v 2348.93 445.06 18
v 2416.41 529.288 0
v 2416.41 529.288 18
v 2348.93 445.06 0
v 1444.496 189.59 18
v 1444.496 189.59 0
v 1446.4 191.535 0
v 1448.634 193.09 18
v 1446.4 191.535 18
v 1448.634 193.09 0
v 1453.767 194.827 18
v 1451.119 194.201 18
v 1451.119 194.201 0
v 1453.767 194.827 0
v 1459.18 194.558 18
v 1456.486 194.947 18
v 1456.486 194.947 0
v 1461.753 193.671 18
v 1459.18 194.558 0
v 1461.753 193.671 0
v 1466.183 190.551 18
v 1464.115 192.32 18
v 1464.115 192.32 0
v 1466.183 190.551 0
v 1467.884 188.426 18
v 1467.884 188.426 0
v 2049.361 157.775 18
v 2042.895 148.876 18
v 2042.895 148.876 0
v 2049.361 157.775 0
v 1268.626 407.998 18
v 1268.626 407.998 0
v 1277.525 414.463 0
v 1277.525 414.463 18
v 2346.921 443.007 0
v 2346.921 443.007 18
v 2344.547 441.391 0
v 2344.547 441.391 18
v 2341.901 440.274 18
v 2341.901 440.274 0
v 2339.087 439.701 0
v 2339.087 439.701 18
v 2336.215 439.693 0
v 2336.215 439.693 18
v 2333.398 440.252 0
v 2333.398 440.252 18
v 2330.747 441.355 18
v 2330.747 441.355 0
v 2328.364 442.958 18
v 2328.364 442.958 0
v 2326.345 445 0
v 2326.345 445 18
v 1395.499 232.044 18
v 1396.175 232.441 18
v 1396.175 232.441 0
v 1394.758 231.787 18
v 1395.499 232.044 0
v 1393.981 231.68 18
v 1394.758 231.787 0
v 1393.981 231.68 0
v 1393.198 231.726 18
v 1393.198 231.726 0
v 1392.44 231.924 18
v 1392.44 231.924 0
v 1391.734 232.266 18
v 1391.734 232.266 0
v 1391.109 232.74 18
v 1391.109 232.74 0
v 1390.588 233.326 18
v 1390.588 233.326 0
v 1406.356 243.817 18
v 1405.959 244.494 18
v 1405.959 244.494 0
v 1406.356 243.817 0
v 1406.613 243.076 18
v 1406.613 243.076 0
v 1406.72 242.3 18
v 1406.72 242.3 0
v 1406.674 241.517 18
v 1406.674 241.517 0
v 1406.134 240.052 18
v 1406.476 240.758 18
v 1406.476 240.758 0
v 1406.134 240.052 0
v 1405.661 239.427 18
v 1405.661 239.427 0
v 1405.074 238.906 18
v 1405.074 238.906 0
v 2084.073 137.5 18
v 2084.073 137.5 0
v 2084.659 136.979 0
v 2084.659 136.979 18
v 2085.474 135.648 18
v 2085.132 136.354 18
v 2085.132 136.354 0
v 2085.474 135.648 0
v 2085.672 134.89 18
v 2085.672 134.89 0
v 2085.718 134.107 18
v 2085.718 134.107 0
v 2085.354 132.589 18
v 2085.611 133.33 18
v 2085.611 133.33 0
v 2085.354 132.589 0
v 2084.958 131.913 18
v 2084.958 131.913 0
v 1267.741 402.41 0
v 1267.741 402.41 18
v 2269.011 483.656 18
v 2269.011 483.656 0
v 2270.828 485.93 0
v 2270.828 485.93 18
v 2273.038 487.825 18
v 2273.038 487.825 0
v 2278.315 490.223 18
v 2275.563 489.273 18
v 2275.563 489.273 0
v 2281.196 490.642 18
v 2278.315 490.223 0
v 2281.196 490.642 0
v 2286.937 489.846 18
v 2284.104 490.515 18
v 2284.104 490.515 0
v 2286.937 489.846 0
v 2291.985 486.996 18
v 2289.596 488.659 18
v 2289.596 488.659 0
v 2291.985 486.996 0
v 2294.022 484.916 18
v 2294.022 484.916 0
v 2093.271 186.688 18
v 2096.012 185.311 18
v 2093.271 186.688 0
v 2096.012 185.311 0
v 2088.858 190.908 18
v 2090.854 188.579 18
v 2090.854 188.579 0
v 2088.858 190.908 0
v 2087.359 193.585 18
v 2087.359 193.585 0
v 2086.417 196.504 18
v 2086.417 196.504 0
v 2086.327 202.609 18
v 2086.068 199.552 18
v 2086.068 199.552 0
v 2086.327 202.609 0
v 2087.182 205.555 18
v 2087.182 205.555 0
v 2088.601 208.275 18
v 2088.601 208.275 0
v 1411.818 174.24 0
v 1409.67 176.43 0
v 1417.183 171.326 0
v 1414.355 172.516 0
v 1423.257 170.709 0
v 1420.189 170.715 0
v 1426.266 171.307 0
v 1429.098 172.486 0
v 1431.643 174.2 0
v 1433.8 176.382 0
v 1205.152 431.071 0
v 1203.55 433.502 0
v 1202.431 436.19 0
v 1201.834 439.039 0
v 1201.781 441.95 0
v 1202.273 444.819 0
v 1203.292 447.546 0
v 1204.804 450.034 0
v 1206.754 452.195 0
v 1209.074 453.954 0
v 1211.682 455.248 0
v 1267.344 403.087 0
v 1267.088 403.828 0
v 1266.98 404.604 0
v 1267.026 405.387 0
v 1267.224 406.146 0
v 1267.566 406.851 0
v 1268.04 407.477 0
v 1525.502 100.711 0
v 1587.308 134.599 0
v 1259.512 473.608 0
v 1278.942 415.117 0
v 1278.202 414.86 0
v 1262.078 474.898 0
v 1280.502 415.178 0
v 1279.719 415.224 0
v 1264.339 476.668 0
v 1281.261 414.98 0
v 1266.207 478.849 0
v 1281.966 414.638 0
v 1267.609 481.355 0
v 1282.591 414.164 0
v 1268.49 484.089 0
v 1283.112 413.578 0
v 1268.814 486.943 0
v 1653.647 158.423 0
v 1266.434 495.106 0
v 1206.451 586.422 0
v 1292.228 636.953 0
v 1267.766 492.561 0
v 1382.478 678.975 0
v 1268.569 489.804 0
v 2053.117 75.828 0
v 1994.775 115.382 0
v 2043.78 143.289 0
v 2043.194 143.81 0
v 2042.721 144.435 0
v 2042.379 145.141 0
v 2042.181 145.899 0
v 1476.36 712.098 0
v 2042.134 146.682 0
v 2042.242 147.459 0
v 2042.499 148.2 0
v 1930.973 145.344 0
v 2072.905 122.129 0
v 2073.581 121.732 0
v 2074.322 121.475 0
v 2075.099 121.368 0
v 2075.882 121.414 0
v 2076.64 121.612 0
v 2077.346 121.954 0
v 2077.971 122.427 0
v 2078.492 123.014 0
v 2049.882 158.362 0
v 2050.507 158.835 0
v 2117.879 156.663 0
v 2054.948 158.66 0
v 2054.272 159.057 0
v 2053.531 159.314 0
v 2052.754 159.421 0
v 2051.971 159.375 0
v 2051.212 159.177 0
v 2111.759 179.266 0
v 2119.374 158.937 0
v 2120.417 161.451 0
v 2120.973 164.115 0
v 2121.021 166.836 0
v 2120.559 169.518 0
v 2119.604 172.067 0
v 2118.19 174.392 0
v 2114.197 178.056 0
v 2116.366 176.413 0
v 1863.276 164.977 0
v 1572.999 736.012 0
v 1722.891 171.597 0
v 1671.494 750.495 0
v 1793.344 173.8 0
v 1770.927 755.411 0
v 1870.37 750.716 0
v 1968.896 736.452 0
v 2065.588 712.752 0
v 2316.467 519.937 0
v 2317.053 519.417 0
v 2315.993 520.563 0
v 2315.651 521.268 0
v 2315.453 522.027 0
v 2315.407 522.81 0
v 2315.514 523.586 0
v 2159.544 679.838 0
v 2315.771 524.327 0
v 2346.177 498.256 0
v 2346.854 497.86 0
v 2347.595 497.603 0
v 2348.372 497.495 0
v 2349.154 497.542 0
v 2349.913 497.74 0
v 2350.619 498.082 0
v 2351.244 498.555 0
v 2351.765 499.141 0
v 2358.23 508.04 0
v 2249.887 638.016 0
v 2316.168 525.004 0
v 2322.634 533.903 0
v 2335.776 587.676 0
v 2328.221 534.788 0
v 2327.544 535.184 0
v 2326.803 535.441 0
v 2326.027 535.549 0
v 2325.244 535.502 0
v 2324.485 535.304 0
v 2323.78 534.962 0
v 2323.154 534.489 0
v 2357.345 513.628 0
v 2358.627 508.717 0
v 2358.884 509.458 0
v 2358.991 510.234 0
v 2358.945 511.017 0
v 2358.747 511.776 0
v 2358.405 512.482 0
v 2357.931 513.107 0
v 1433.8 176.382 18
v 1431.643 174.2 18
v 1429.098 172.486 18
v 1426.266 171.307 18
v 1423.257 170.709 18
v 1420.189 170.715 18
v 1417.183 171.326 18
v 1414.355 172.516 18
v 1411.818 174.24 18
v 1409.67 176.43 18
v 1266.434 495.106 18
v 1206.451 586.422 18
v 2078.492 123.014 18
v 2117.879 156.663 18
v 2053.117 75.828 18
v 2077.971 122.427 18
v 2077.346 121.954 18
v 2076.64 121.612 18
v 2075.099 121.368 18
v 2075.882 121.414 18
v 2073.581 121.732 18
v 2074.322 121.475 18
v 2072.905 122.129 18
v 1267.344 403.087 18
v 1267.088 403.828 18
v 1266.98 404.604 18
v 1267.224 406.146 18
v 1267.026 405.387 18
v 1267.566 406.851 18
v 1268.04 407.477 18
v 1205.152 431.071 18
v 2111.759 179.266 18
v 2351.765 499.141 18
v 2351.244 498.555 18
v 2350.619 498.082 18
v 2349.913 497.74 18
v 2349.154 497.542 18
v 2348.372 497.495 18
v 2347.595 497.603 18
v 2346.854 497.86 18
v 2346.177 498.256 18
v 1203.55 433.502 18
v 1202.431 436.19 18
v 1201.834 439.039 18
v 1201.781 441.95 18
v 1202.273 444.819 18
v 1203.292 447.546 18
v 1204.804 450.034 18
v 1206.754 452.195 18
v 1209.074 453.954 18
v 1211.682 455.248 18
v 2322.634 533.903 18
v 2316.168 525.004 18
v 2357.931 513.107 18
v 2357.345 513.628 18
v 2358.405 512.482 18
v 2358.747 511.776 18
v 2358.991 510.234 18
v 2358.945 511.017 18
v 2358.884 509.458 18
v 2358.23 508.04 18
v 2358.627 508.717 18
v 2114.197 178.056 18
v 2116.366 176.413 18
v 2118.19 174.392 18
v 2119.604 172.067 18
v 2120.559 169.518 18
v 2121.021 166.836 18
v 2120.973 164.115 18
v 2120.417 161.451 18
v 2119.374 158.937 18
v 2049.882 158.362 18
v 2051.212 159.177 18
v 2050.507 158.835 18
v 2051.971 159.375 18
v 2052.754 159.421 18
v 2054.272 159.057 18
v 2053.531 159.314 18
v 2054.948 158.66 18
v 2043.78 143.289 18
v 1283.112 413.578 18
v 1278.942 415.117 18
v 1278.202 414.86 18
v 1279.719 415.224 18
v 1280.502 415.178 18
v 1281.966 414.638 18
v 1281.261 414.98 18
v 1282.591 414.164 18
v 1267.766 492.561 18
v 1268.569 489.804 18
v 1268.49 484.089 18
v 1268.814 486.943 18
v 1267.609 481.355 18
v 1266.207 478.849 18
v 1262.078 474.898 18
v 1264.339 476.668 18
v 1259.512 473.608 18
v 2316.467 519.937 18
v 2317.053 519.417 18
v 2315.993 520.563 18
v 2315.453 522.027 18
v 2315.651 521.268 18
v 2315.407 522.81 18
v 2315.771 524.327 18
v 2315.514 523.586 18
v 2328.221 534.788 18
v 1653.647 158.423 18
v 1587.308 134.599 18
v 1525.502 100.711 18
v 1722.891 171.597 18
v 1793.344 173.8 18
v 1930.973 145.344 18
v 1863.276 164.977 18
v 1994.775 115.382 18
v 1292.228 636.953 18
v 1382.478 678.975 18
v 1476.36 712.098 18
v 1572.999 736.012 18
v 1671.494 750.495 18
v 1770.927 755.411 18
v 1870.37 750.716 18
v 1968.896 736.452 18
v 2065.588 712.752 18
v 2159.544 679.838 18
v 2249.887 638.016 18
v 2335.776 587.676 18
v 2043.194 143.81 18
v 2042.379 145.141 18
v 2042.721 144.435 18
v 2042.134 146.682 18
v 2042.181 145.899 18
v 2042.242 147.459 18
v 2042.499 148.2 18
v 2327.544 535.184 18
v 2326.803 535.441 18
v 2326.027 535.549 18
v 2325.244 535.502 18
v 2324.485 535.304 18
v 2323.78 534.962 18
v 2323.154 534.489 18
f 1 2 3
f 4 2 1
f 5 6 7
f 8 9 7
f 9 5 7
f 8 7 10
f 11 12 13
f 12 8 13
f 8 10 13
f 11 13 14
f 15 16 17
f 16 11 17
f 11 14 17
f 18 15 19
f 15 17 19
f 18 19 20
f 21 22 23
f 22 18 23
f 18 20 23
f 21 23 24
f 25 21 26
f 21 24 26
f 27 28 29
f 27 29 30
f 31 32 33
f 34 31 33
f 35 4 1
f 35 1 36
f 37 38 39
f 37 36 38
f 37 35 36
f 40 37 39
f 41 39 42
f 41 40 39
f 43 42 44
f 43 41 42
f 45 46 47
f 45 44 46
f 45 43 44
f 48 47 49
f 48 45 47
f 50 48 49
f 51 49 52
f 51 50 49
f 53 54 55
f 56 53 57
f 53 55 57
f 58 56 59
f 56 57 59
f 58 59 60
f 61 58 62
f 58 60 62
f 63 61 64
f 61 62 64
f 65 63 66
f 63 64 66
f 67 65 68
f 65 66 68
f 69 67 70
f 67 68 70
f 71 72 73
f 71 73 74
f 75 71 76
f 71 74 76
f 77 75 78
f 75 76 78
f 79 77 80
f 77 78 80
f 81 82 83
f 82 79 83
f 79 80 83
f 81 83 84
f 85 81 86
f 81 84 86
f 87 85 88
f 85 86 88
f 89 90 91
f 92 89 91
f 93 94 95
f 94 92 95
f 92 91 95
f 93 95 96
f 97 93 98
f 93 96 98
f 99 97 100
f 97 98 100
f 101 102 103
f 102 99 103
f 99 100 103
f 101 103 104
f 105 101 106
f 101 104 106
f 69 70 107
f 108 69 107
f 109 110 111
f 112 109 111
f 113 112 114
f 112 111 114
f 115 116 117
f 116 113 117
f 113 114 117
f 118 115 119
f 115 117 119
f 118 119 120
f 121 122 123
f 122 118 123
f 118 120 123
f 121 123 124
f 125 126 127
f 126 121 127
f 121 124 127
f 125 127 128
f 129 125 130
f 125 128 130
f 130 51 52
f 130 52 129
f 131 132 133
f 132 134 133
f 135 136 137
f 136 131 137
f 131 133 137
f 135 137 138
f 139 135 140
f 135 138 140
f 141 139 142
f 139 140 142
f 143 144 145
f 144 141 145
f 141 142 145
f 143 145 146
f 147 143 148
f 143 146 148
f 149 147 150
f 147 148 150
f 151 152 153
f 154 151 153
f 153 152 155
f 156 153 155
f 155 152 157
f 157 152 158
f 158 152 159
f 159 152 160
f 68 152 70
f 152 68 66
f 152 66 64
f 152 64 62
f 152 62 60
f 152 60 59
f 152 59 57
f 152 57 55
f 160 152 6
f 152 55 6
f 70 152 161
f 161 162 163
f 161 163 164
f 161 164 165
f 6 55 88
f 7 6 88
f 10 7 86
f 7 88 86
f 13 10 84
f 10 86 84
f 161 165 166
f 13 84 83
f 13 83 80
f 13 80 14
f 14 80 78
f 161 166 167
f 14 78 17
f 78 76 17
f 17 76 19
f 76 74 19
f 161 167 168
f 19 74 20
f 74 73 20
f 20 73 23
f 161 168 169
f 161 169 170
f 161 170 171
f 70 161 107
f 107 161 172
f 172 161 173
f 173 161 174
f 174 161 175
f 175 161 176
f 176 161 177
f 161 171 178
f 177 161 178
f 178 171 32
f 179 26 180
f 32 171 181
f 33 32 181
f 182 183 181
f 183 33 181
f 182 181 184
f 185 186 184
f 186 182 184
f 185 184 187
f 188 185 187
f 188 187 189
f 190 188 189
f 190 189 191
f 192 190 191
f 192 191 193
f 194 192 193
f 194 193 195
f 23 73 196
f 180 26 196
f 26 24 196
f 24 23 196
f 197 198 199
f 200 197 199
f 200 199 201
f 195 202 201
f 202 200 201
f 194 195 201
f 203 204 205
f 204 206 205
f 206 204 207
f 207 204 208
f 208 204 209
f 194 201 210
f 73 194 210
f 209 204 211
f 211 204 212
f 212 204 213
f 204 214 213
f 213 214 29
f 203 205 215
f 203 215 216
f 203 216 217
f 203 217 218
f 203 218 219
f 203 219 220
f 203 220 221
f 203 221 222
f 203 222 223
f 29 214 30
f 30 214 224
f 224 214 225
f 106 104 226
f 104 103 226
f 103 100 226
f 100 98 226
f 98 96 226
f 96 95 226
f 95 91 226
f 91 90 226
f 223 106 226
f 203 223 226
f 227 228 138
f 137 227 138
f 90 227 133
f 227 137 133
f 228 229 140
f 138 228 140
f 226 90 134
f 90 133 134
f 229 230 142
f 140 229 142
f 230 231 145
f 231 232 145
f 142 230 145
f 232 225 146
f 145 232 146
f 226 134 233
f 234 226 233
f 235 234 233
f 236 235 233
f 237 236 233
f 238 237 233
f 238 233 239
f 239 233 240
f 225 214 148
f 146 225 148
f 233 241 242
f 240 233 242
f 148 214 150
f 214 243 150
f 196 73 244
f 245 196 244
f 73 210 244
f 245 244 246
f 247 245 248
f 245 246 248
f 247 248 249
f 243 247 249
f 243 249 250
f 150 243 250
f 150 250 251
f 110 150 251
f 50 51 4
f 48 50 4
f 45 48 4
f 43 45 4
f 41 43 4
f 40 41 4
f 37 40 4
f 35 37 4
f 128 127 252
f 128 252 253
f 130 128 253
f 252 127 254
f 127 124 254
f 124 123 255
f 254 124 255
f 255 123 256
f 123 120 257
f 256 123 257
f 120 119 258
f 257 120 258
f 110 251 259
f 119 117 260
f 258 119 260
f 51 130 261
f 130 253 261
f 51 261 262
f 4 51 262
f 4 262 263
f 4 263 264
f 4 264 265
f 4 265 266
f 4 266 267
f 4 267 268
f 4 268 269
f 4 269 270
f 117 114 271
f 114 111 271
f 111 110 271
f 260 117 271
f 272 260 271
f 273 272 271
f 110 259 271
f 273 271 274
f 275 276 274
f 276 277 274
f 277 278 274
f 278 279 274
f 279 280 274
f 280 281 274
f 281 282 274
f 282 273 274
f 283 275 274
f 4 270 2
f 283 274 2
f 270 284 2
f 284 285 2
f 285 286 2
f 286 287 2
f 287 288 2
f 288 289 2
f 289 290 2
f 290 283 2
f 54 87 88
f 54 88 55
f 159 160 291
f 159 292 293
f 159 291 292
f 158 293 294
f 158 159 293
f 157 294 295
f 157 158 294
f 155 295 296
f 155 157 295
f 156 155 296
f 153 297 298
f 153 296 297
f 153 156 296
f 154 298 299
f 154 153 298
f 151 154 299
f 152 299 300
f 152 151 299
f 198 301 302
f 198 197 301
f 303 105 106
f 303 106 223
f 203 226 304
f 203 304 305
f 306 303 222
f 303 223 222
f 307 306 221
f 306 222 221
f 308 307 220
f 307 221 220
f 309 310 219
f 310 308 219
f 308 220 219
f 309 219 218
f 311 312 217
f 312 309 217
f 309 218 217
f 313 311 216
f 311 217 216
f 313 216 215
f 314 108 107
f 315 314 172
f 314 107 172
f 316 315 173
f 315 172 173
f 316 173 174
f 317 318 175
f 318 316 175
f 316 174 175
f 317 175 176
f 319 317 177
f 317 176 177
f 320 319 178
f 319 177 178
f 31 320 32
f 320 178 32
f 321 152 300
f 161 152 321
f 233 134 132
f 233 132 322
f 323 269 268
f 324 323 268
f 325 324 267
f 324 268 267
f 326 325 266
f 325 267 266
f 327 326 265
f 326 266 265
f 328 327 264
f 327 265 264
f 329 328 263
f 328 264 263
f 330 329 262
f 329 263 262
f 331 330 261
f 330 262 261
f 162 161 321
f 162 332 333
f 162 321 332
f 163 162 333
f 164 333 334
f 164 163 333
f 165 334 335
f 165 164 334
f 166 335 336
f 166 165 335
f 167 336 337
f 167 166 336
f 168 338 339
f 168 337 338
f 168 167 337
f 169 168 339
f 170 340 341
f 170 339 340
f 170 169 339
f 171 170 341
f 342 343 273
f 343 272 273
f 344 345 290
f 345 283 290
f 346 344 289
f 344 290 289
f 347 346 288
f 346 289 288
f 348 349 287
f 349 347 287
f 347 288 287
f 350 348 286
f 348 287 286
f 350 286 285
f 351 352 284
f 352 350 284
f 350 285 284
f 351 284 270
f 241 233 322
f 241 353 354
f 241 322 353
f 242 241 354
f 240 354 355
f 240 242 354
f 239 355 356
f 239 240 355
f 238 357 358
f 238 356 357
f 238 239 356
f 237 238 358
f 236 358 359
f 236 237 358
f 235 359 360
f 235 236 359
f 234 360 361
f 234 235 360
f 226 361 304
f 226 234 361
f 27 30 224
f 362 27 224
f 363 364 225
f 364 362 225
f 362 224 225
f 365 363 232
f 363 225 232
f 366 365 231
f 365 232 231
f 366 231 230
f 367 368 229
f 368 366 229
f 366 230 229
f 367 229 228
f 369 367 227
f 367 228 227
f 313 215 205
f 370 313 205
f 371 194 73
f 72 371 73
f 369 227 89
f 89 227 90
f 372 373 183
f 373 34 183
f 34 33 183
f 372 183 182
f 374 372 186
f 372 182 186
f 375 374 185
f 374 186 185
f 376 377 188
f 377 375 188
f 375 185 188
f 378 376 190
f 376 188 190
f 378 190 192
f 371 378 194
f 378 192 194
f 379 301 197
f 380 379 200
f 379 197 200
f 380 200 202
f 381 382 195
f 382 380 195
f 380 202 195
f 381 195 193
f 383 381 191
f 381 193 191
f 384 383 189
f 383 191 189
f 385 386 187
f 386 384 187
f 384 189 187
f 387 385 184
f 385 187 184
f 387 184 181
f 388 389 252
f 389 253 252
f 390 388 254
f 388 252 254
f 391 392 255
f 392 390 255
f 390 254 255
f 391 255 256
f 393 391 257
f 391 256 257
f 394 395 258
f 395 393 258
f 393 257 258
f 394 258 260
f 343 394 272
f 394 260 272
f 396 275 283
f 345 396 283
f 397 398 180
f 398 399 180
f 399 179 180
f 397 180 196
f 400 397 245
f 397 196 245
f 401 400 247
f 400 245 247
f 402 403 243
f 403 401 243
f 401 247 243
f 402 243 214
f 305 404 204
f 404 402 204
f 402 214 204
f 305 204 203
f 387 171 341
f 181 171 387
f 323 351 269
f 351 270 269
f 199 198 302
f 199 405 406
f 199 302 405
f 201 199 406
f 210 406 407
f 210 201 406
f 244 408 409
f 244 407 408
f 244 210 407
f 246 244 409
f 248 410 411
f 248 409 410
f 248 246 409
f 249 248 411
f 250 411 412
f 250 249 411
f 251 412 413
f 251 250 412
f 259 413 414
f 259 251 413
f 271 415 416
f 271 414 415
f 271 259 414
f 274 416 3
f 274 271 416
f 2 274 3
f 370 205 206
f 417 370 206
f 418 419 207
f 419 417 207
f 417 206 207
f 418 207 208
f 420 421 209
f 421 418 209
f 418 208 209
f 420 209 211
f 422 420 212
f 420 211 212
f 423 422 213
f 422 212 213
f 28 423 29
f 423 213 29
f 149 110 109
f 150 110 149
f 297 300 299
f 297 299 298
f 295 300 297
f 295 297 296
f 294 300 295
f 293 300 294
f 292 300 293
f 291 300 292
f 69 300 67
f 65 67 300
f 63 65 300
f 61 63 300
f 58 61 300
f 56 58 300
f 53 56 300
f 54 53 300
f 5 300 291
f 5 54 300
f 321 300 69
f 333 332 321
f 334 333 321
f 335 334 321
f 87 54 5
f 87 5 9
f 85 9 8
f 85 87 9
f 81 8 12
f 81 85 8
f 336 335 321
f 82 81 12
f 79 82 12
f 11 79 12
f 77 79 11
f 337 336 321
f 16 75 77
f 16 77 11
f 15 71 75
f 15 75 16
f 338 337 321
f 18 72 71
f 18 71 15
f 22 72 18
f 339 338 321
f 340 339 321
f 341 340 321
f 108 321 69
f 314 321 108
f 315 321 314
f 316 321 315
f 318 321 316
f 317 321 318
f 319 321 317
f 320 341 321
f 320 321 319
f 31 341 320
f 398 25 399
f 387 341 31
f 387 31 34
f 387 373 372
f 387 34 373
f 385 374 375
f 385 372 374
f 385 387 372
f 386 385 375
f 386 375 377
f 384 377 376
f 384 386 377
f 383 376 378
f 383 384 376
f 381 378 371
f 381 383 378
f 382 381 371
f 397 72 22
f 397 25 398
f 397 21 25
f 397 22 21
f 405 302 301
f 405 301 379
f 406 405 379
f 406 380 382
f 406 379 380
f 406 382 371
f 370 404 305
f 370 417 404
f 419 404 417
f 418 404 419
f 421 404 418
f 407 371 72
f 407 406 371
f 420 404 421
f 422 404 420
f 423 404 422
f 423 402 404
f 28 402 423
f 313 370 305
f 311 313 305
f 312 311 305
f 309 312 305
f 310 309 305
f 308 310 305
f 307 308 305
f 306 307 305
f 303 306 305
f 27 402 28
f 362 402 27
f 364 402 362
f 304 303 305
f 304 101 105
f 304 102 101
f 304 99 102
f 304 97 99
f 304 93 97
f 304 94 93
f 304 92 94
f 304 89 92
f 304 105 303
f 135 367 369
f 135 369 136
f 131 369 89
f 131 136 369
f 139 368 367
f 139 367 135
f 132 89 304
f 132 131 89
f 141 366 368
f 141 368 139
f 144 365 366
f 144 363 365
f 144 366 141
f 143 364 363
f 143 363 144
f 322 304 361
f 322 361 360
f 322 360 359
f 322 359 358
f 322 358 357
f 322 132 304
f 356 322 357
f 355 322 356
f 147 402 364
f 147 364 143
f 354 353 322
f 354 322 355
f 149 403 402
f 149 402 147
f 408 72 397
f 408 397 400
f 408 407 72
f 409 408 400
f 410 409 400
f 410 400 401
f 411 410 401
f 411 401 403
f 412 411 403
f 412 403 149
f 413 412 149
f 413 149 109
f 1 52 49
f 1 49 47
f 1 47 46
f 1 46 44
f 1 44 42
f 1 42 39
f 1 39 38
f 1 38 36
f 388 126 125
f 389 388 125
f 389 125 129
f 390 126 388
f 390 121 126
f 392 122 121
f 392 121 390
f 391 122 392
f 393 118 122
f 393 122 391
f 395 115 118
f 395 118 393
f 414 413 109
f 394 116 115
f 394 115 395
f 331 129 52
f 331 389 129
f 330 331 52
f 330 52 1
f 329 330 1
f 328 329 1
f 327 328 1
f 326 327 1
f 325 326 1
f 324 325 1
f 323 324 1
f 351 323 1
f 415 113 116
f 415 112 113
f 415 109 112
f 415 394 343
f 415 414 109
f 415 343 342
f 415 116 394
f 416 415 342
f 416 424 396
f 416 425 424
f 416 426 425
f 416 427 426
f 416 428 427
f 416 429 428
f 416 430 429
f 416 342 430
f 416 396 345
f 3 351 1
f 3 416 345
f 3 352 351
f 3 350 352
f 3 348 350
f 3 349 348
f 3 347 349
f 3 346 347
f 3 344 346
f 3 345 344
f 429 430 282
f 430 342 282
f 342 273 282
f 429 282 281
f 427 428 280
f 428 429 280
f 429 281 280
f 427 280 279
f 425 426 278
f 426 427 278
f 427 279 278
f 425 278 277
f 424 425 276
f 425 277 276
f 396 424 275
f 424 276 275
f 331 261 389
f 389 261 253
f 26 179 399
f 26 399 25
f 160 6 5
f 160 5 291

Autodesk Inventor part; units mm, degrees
ref_plane "YZ Plane" through (0, 0, 0) normal (1, 0, 0) x (0, 1, 0)
ref_plane "XZ Plane" through (0, 0, 0) normal (0, 1, 0) x (-1, 0, 0)
ref_plane "XY Plane" through (0, 0, 0) normal (0, 0, 1) x (1, 0, 0)
sketch "CONTOURS" plane through (0, 0, 0) normal (0, 0, 1) x (1, 0, 0)
  arc A0 (1467.8843, 188.4261) -> (1444.4964, 189.5904) centre (1455.765, 180.4653) ccw
  line L0 (1444.4964, 189.5904) -> (1433.8001, 176.3815)
  arc A1 (1409.6695, 176.43) -> (1433.8001, 176.3815) centre (1421.7543, 186.136) ccw
  line L1 (1409.6695, 176.43) -> (1205.1516, 431.0714)
  arc A2 (1211.6817, 455.248) -> (1205.1516, 431.0714) centre (1217.2364, 440.7775) ccw
  line L2 (1211.6817, 455.248) -> (1259.5115, 473.6081)
  arc A3 (1259.5115, 473.6081) -> (1266.4344, 495.1059) centre (1254.3152, 487.1451) ccw
  line L3 (1266.4344, 495.1059) -> (1206.4511, 586.4222)
  arc A4 (2416.4096, 529.2878) -> (1206.4511, 586.4222) centre (1772.0714, -275.6668) ccw
  line L4 (2416.4096, 529.2878) -> (2348.9296, 445.0595)
  arc A5 (2326.3448, 445.0004) -> (2348.9296, 445.0595) centre (2337.6134, 454.1255) ccw
  line L5 (2326.3448, 445.0004) -> (2294.0217, 484.916)
  arc A6 (2294.0217, 484.916) -> (2269.0106, 483.6555) centre (2281.976, 475.1615) ccw
  line L6 (2269.0106, 483.6555) -> (2088.6011, 208.2752)
  arc A7 (2088.6011, 208.2752) -> (2096.0118, 185.3107) centre (2101.5665, 199.7812) ccw
  line L7 (2096.0118, 185.3107) -> (2111.7592, 179.2658)
  arc A8 (2117.8791, 156.6628) -> (2111.7592, 179.2658) centre (2106.5629, 165.7289) ccw
  line L8 (2117.8791, 156.6628) -> (2053.1174, 75.8275)
  arc A9 (2053.1174, 75.8275) -> (1525.5022, 100.7107) centre (1772.1395, -275.8029) ccw
  line L9 (1525.5022, 100.7107) -> (1467.8843, 188.4261)
sketch "HOLES" plane through (0, 0, 0) normal (0, 0, 1) x (1, 0, 0)
  line L0 (2054.9481, 158.6603) -> (2084.0727, 137.5)
  arc A0 (2084.9576, 131.9128) -> (2084.0727, 137.5) centre (2081.7215, 134.264) ccw
  line L1 (2084.9576, 131.9128) -> (2078.492, 123.0136)
  arc A1 (2072.9048, 122.1287) -> (2078.492, 123.0136) centre (2075.2559, 125.3648) ccw
  line L2 (2072.9048, 122.1287) -> (2043.7801, 143.289)
  arc A2 (2042.8952, 148.8762) -> (2043.7801, 143.289) centre (2046.1313, 146.5251) ccw
  line L3 (2042.8952, 148.8762) -> (2049.3609, 157.7754)
  arc A3 (2054.9481, 158.6603) -> (2049.3609, 157.7754) centre (2052.5969, 155.4242) ccw
  line L4 (1405.0745, 238.9064) -> (1396.1753, 232.4408)
  arc A4 (1390.5881, 233.3257) -> (1396.1753, 232.4408) centre (1393.8242, 235.6768) ccw
  line L5 (1390.5881, 233.3257) -> (1267.741, 402.4102)
  arc A5 (1268.6259, 407.9975) -> (1267.741, 402.4102) centre (1270.9771, 404.7614) ccw
  line L6 (1268.6259, 407.9975) -> (1277.5251, 414.4631)
  arc A6 (1283.1123, 413.5782) -> (1277.5251, 414.4631) centre (1279.8762, 411.227) ccw
  line L7 (1283.1123, 413.5782) -> (1405.9594, 244.4936)
  arc A7 (1405.0745, 238.9064) -> (1405.9594, 244.4936) centre (1402.7234, 242.1425) ccw
  line L8 (2316.1678, 525.0037) -> (2322.6335, 533.9029)
  arc A8 (2328.2207, 534.7878) -> (2322.6335, 533.9029) centre (2325.8696, 531.5518) ccw
  line L9 (2328.2207, 534.7878) -> (2357.3453, 513.6276)
  arc A9 (2358.2302, 508.0403) -> (2357.3453, 513.6276) centre (2354.9942, 510.3915) ccw
  line L10 (2358.2302, 508.0403) -> (2351.7646, 499.1412)
  arc A10 (2346.1774, 498.2562) -> (2351.7646, 499.1412) centre (2348.5285, 501.4923) ccw
  line L11 (2346.1774, 498.2562) -> (2317.0528, 519.4165)
  arc A11 (2316.1678, 525.0037) -> (2317.0528, 519.4165) centre (2319.4039, 522.6526) ccw
sketch "LETTERS" plane through (0, 0, 0) normal (0, 0, 1) x (1, 0, 0)
  line L0 (2123.0862, 379.0631) -> (2113.6777, 384.09)
  line L1 (2105.5346, 377.443) -> (2118.4889, 370.5215)
  line L2 (2118.4889, 370.5215) -> (2127.8234, 387.992)
extrude "Extrusion3" add sketch "CONTOURS" along normal blind 18
extrude "Extrusion4" cut sketch "HOLES" along normal blind 18
properties part number "Platform F3" material "Wood (Birch)"
